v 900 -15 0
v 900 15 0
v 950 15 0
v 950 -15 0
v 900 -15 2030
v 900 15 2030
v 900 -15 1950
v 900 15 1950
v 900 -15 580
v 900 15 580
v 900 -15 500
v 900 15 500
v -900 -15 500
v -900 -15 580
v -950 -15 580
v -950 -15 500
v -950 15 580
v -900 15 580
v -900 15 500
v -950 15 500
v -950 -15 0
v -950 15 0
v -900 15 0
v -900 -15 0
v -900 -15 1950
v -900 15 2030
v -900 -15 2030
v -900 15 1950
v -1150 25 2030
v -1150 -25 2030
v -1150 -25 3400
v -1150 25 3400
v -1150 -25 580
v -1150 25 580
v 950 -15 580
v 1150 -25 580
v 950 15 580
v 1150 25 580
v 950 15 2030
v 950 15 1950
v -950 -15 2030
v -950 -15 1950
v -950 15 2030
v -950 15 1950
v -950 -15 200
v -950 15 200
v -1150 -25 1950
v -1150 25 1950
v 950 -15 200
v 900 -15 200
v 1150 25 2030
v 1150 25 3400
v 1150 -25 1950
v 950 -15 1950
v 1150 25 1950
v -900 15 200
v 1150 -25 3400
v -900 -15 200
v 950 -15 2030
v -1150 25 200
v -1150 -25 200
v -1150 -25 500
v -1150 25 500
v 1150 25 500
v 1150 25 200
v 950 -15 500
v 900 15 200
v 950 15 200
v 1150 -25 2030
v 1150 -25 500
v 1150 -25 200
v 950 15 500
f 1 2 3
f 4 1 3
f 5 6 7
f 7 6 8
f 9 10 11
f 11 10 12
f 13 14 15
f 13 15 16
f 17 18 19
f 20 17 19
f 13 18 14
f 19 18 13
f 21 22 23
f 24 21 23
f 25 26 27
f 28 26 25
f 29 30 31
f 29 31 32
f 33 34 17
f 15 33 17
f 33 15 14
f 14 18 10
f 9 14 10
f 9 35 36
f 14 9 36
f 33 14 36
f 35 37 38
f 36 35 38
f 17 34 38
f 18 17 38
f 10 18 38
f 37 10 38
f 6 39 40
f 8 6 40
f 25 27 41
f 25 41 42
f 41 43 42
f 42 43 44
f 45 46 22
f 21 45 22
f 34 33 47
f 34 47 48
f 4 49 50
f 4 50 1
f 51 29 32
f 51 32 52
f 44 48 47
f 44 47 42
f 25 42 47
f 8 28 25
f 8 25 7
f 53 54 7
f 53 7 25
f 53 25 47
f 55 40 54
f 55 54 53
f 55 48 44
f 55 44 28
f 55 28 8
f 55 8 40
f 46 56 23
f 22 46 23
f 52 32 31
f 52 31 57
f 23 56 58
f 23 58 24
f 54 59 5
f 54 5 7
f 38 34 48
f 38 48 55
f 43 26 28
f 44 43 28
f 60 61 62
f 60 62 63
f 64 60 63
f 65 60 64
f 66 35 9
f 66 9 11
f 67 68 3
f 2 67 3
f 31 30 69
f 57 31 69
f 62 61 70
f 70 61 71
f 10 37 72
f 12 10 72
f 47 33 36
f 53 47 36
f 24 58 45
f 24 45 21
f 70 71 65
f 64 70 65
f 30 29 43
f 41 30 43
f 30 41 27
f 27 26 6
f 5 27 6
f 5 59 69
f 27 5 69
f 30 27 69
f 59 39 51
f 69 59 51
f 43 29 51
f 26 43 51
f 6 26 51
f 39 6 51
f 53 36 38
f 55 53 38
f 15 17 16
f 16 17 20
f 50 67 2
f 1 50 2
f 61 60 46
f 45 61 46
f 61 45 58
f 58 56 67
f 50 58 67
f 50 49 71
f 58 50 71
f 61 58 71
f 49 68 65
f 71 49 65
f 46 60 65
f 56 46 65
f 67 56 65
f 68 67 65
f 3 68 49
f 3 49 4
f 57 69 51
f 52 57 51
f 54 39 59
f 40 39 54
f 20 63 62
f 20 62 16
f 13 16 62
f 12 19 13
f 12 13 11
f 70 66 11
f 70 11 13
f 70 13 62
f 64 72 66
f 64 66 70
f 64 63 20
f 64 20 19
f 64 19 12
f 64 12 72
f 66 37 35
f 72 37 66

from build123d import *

# Parameters (mm, degrees)
SCHIZZO1_W                   = 2300
SCHIZZO1_H                   = 50
ESTRUSIONE_ESTRUSIONE1_DEPTH = 3400
SCHIZZO2_W                   = 200
SCHIZZO2_H                   = 80
SCHIZZO2_H_2                 = 200
SCHIZZO2_W_2                 = 1800
TAGLIO_ESTRUSIONE1_DEPTH     = 3590.56821916
SCHIZZO3_W                   = 80
SCHIZZO3_H                   = 10
SCHIZZO3_W_2                 = 200
TAGLIO_ESTRUSIONE2_DEPTH     = 4105.951278639


with BuildPart() as part:
    # Schizzo1 → Estrusione-Estrusione1 (new body)
    with BuildSketch(Plane.XY):
        Rectangle(SCHIZZO1_W, SCHIZZO1_H)
    extrude(amount=ESTRUSIONE_ESTRUSIONE1_DEPTH)

    # Schizzo2 → Taglio-Estrusione1 (cut, through all)
    with BuildSketch(Plane(origin=(0, 25, 0), x_dir=(1, 0, 0), z_dir=(0, 1, 0))):
        with Locations((-1050, -1990)):
            Rectangle(SCHIZZO2_W, SCHIZZO2_H)
        with Locations((1050, -1990)):
            Rectangle(SCHIZZO2_W, SCHIZZO2_H)
        with Locations((-1050, -540)):
            Rectangle(SCHIZZO2_W, SCHIZZO2_H)
        with Locations((1050, -540)):
            Rectangle(SCHIZZO2_W, SCHIZZO2_H)
        with Locations((-1050, -100)):
            Rectangle(SCHIZZO2_W, SCHIZZO2_H_2)
        with Locations((1050, -100)):
            Rectangle(SCHIZZO2_W, SCHIZZO2_H_2)
        with Locations((0, -100)):
            Rectangle(SCHIZZO2_W_2, SCHIZZO2_H_2)
        with Locations((0, -1990)):
            Rectangle(SCHIZZO2_W_2, SCHIZZO2_H)
        with Locations((0, -540)):
            Rectangle(SCHIZZO2_W_2, SCHIZZO2_H)
    extrude(amount=-TAGLIO_ESTRUSIONE1_DEPTH, mode=Mode.SUBTRACT)

    # Schizzo3 → Taglio-Estrusione2 (cut, through all)
    with BuildSketch(Plane(origin=(1150, 0, 0), x_dir=(0, 0, -1), z_dir=(1, 0, 0))):
        with Locations((-1990, 20)):
            Rectangle(SCHIZZO3_W, SCHIZZO3_H)
        with Locations((-1990, -20)):
            Rectangle(SCHIZZO3_W, SCHIZZO3_H)
        with Locations((-540, 20)):
            Rectangle(SCHIZZO3_W, SCHIZZO3_H)
        with Locations((-540, -20)):
            Rectangle(SCHIZZO3_W, SCHIZZO3_H)
        with Locations((-100, 20)):
            Rectangle(SCHIZZO3_W_2, SCHIZZO3_H)
        with Locations((-100, -20)):
            Rectangle(SCHIZZO3_W_2, SCHIZZO3_H)
    extrude(amount=-TAGLIO_ESTRUSIONE2_DEPTH, mode=Mode.SUBTRACT)


solid = part.part
